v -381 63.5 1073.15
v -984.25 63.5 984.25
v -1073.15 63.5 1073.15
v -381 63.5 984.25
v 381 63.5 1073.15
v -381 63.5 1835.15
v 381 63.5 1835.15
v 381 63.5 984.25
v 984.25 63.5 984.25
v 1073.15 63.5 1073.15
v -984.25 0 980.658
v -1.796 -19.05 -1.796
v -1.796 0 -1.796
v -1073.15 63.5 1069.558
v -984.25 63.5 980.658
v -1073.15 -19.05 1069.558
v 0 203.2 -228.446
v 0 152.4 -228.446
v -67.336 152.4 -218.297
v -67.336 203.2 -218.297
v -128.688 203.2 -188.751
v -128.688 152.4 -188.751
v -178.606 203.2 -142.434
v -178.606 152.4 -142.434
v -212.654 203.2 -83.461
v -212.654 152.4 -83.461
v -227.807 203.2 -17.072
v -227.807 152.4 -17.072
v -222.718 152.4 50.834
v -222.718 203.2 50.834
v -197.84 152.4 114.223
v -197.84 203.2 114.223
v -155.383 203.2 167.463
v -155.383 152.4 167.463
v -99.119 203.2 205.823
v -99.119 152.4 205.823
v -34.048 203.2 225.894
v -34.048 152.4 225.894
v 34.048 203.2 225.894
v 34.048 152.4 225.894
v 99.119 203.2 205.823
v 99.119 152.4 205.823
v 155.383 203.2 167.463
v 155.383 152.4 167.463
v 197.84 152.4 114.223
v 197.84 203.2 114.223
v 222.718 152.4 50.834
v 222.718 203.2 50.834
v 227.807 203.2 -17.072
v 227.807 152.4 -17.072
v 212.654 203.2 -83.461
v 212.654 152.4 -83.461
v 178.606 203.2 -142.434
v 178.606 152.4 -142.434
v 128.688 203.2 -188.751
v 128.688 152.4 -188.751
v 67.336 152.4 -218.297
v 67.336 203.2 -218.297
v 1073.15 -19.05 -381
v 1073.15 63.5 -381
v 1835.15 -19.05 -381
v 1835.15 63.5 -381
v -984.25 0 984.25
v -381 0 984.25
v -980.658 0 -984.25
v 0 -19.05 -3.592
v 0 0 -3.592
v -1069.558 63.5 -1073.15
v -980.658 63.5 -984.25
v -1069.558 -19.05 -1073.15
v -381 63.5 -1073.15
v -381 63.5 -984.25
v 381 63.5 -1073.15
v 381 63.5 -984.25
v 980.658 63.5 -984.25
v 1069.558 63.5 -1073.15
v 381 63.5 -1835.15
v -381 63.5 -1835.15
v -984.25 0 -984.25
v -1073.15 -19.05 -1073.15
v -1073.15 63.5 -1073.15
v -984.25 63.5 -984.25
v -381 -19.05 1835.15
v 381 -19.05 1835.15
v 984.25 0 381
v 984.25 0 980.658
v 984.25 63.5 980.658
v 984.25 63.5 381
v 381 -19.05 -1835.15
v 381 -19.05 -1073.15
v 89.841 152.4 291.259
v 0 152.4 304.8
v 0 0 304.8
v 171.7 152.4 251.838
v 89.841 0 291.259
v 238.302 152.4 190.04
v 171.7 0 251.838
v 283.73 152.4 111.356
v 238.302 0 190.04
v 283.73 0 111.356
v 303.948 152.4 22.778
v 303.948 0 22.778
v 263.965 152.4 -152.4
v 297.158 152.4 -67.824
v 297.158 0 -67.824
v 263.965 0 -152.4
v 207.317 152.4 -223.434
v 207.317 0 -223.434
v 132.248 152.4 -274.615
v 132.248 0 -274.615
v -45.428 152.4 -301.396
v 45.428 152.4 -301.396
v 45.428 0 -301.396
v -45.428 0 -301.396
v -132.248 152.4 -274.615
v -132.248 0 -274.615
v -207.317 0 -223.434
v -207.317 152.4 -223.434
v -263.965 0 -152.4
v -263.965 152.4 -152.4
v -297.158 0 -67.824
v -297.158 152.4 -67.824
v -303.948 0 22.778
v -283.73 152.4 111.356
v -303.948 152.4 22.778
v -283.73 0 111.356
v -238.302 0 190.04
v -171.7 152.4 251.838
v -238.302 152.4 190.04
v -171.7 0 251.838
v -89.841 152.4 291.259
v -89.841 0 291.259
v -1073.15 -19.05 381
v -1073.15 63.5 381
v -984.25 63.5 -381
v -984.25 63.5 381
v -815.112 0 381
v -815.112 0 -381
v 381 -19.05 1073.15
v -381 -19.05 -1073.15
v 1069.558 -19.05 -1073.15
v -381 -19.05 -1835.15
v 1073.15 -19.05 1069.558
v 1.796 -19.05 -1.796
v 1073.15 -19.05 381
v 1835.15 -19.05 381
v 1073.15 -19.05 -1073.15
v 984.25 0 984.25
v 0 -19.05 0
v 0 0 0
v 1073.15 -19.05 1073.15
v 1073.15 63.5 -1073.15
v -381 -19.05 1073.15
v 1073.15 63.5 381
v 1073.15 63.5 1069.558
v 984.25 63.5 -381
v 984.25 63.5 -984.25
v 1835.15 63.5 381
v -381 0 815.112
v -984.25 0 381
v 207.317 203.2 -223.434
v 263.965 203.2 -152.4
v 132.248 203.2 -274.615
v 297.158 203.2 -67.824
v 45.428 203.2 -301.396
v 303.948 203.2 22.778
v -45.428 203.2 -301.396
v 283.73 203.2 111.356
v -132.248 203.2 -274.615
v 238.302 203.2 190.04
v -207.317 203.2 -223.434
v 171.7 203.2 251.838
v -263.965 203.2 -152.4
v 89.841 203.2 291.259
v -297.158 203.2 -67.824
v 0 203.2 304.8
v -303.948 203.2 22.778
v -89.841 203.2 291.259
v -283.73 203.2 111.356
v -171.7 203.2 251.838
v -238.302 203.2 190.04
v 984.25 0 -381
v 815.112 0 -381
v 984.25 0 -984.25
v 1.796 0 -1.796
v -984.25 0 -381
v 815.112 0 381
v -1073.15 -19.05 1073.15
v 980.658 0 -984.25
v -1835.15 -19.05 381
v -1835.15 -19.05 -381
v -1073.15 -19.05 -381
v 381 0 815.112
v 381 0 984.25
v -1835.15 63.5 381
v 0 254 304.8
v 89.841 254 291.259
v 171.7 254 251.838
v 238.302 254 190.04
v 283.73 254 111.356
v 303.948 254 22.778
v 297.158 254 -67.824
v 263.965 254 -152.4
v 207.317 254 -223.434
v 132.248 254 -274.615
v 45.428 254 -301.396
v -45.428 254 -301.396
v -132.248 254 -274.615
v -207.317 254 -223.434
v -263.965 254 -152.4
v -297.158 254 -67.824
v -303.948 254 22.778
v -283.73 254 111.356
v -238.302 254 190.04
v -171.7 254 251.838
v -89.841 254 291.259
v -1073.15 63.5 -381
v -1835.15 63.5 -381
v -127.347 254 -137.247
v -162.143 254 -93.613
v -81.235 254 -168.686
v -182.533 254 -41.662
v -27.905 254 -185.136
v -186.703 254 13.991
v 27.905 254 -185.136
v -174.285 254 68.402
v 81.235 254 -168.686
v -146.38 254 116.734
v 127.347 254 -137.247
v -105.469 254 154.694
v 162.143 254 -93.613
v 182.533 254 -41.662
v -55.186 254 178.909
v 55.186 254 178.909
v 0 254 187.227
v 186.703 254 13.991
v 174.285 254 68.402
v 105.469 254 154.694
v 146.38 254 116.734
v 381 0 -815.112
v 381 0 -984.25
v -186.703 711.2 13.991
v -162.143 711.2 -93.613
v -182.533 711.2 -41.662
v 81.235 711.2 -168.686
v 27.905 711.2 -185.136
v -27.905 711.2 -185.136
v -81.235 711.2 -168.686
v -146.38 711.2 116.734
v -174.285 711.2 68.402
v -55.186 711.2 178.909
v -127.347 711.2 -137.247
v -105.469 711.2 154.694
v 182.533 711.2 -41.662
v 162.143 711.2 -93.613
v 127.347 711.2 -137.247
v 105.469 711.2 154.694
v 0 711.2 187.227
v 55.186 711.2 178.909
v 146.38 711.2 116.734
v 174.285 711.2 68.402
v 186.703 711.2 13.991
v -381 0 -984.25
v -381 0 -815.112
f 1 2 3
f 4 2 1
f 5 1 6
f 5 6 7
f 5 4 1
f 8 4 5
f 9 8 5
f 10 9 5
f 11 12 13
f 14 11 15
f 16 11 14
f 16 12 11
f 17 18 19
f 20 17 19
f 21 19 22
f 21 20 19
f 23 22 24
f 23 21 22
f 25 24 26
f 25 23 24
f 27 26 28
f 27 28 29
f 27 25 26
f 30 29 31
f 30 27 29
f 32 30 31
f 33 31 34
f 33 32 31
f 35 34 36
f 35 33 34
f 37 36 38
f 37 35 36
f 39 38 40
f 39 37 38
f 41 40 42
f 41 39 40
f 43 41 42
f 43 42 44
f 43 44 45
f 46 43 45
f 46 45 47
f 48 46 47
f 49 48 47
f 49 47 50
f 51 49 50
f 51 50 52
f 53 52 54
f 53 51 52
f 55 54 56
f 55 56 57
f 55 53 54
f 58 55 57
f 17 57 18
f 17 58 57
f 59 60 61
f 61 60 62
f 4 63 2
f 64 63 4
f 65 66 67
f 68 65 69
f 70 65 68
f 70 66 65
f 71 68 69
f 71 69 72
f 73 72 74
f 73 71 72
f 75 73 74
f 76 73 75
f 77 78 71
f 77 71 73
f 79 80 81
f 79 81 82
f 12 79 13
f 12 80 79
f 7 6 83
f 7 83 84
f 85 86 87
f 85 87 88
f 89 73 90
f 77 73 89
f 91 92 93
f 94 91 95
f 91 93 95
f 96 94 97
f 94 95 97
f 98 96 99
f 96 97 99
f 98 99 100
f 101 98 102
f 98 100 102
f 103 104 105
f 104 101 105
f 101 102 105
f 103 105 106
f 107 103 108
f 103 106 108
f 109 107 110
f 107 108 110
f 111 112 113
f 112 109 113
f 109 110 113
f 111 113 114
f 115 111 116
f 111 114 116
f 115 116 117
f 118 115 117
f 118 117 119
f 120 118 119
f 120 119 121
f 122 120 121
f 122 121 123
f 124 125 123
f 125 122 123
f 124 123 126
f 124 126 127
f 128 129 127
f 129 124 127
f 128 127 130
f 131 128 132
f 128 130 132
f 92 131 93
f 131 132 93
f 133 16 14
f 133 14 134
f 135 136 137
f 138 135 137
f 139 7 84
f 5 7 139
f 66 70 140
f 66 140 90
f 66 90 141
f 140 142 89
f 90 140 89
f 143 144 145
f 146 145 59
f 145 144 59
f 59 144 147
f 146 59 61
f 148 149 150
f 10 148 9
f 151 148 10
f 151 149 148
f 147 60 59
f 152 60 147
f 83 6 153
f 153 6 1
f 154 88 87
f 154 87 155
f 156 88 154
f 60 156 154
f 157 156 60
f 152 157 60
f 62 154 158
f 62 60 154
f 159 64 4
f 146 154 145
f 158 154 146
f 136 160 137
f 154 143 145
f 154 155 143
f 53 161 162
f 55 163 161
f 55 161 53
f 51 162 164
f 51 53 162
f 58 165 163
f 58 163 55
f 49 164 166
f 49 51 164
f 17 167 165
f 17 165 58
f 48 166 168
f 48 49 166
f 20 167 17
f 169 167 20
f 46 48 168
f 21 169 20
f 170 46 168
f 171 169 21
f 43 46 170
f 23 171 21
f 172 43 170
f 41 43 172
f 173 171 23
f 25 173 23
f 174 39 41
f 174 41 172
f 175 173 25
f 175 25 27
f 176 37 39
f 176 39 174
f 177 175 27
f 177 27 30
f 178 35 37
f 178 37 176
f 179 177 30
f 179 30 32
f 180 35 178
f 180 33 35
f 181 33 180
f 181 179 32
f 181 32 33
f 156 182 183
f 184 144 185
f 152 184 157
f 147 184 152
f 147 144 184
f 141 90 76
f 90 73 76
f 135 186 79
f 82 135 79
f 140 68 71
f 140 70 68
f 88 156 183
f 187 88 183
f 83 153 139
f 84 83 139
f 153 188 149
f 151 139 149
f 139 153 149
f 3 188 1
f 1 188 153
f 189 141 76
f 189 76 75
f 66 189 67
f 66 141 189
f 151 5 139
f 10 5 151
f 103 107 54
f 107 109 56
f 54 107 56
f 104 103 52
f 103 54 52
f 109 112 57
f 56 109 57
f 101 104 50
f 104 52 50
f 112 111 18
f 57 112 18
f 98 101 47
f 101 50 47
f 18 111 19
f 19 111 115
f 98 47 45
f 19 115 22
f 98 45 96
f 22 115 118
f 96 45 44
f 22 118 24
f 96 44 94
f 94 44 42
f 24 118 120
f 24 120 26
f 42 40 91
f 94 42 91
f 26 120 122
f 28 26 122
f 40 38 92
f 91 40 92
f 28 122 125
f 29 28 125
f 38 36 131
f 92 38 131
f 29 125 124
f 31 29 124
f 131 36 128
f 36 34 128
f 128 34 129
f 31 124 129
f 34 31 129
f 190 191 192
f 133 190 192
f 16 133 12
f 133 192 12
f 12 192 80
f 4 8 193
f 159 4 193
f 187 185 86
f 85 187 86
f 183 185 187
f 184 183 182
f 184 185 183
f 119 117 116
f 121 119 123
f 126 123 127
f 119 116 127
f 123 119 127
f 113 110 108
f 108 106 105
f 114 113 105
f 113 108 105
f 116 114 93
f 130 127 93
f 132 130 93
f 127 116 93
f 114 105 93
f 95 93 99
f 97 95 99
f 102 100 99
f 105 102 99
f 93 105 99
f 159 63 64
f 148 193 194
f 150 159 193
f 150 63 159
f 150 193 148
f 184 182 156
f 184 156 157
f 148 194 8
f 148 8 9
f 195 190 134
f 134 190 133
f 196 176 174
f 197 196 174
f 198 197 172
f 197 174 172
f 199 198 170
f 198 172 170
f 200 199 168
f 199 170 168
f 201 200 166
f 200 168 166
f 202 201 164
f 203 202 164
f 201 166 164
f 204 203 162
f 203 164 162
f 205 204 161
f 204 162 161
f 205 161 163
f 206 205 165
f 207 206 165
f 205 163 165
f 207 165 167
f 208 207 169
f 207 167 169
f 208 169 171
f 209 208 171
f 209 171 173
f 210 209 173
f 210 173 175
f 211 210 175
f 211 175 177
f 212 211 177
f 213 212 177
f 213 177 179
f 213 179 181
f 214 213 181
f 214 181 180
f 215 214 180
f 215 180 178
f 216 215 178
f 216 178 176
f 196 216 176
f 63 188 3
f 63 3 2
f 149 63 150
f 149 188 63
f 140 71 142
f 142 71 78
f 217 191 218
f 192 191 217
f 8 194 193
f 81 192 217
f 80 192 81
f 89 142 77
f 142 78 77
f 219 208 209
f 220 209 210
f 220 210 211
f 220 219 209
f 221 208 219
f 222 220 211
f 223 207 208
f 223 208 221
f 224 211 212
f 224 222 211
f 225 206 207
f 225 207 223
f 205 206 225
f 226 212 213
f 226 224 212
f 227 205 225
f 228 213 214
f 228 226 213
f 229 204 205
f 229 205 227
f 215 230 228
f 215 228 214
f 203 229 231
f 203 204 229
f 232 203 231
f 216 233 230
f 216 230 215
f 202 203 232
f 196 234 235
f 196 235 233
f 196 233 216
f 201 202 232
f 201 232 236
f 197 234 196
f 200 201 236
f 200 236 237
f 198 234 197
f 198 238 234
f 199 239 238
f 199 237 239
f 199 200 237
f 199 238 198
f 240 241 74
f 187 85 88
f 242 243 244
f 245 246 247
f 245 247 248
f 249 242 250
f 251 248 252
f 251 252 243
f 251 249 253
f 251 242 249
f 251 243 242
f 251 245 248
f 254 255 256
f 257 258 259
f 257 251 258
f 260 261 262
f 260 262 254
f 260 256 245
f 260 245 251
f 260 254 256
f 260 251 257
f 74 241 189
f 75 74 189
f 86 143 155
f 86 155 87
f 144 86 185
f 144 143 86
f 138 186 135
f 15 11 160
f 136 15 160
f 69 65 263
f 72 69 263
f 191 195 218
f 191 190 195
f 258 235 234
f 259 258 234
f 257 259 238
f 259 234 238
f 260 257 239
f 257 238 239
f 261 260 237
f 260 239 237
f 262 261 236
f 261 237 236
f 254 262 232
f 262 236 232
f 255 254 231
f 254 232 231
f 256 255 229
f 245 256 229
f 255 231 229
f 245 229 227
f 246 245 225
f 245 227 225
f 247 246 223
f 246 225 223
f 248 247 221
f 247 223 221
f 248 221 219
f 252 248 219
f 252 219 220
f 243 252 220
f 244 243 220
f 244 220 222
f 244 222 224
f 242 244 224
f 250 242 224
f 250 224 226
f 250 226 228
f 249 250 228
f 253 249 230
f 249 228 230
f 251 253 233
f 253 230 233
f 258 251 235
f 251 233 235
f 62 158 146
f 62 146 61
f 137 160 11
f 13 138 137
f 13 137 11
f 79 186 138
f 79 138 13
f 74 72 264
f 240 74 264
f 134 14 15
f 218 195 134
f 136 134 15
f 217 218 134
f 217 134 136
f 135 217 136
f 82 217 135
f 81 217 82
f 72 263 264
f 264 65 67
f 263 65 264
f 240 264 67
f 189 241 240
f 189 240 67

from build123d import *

# Parameters (mm, degrees)
PLYWOOD_BASE_DEPTH           = 19.05
FIELD_LAYOUT_3_W             = 1968.5
FIELD_LAYOUT_3_H             = 1968.5
RAISED_BASE_DEPTH            = 63.5
FIELD_LAYOUT_4_W             = 762
FIELD_LAYOUT_4_H             = 169.138249808
RAMP_EXTRUDE_DEPTH           = 63.5
CUT_RAMP_SLOPE_REACH         = 2880.042
COPY_RAMP_SLOPE_COUNT        = 4
SKETCH5_R                    = 304.8
BOSS_EXTRUDE1_DEPTH          = 254
CUT_EXTRUDE_THIN1_DEPTH      = 2608.693817341
CUT_EXTRUDE_THIN1_DEPTH_BACK = 2608.693817341
SKETCH6_R                    = 187.226802171
BOSS_EXTRUDE2_DEPTH          = 457.2
SKETCH7_W                    = 76.354251867
SKETCH7_H                    = 50.8


with BuildPart() as part:
    # Field Layout → Plywood Base (new body)
    with BuildSketch(Plane(origin=(0, 0, 0), x_dir=(1, 0, 0), z_dir=(0, 1, 0))):
        Polygon((-381, 1073.15), (-1073.15, 1073.15), (-1073.15, 381), (-1835.15, 381), (-1835.15, -381), (-1073.15, -381), (-1073.15, -1073.15), (-381, -1073.15), (-381, -1835.15), (381, -1835.15), (381, -1073.15), (1073.15, -1073.15), (1073.15, -381), (1835.15, -381), (1835.15, 381), (1073.15, 381), (1073.15, 1073.15), (381, 1073.15), (381, 1835.15), (-381, 1835.15), align=None)
    extrude(amount=-PLYWOOD_BASE_DEPTH)

    # Field Layout<3> → Raised Base (add)
    with BuildSketch(Plane(origin=(0, 0, 0), x_dir=(1, 0, 0), z_dir=(0, 1, 0))):
        Polygon((-381, 1073.15), (-1073.15, 1073.15), (-1073.15, 381), (-1835.15, 381), (-1835.15, -381), (-1073.15, -381), (-1073.15, -1073.15), (-381, -1073.15), (-381, -1835.15), (381, -1835.15), (381, -1073.15), (1073.15, -1073.15), (1073.15, -381), (1835.15, -381), (1835.15, 381), (1073.15, 381), (1073.15, 1073.15), (381, 1073.15), (381, 1835.15), (-381, 1835.15), align=None)
        Rectangle(FIELD_LAYOUT_3_W, FIELD_LAYOUT_3_H, mode=Mode.SUBTRACT)
    extrude(amount=RAISED_BASE_DEPTH)

    # Field Layout<4> → Ramp Extrude (add)
    with BuildSketch(Plane(origin=(0, 0, 0), x_dir=(1, 0, 0), z_dir=(0, 1, 0))):
        with Locations((0, -899.680875096)):
            Rectangle(FIELD_LAYOUT_4_W, FIELD_LAYOUT_4_H)
    ramp_extrude = extrude(amount=RAMP_EXTRUDE_DEPTH)

    # Sketch3 → Cut ramp slope (cut, up to next)
    with BuildSketch(Plane(origin=(381, 0, 0), x_dir=(0, 0, -1), z_dir=(1, 0, 0)), mode=Mode.PRIVATE) as cut_ramp_slope_sk1:
        Polygon((-815.111750192, 63.5), (-984.25, 63.5), (-815.111750192, 0), align=None)
    cut_ramp_slope_tool1 = extrude(cut_ramp_slope_sk1.sketch, amount=-CUT_RAMP_SLOPE_REACH, mode=Mode.PRIVATE) & part.part
    cut_ramp_slope = cut_ramp_slope_tool1.solids().sort_by_distance((381, 42.333333, 871.491167))[0]
    add(cut_ramp_slope, mode=Mode.SUBTRACT)

    # Copy Ramp Slope: Ramp Extrude, Cut ramp slope ×4 about axis
    copy_ramp_slope_axis = Axis((0, -19.05, 0), (0, -1, 0))
    add([ramp_extrude.rotate(copy_ramp_slope_axis, i * 360 / COPY_RAMP_SLOPE_COUNT) for i in range(1, COPY_RAMP_SLOPE_COUNT)])
    add([cut_ramp_slope.rotate(copy_ramp_slope_axis, i * 360 / COPY_RAMP_SLOPE_COUNT) for i in range(1, COPY_RAMP_SLOPE_COUNT)], mode=Mode.SUBTRACT)

    # Sketch4 → Cut-Extrude-Thin1 (cut, two sides: drawn at the far end of the back side and taken through both)
    with BuildSketch(Plane(origin=(0, 0, 0), x_dir=(1, 0, 0), z_dir=(0, 1, 0)).offset(-CUT_EXTRUDE_THIN1_DEPTH_BACK)):
        Polygon((-1073.15, -1073.15), (-984.25, -984.25), (984.25, 984.25), (1073.15, 1073.15), (1071.353948776, 1074.946051224), (982.453948776, 986.046051224), (-986.046051224, -982.453948776), (-1074.946051224, -1071.353948776), align=None)
        Polygon((-1073.15, 1073.15), (-984.25, 984.25), (984.25, -984.25), (1073.15, -1073.15), (1074.946051224, -1071.353948776), (986.046051224, -982.453948776), (-982.453948776, 986.046051224), (-1071.353948776, 1074.946051224), align=None)
    extrude(amount=CUT_EXTRUDE_THIN1_DEPTH + CUT_EXTRUDE_THIN1_DEPTH_BACK, mode=Mode.SUBTRACT)


with BuildPart() as body_2:
    # Sketch5 → Boss-Extrude1 (new body)
    with BuildSketch(Plane(origin=(0, 0, 0), x_dir=(1, 0, 0), z_dir=(0, 1, 0))):
        Circle(SKETCH5_R)
    extrude(amount=BOSS_EXTRUDE1_DEPTH)

    # Sketch6 → Boss-Extrude2 (add)
    with BuildSketch(Plane(origin=(0, 254, 0), x_dir=(1, 0, 0), z_dir=(0, 1, 0))):
        Circle(SKETCH6_R)
    extrude(amount=BOSS_EXTRUDE2_DEPTH)

    # Sketch7 → Cut-Revolve1 (revolve, cut)
    with BuildSketch(Plane.XY):
        with Locations((266.622874067, 177.8)):
            Rectangle(SKETCH7_W, SKETCH7_H)
    revolve(axis=Axis((0, 0, 0), (0, 1, 0)), mode=Mode.SUBTRACT)


with BuildPart() as cut_extrude_thin1_piece_1:
    # of the separate pieces the step leaves, piece 1, a body of its own (cut_extrude_thin1_pieces)
    add(part.part.solids().sort_by_distance((0, -19.05, 0))[0])


with BuildPart() as cut_extrude_thin1_piece_2:
    # of the separate pieces the step leaves, piece 2, a body of its own (cut_extrude_thin1_pieces)
    add(part.part.solids().sort_by_distance((-1073.15, -19.05, -1073.15))[0])


with BuildPart() as cut_extrude_thin1_piece_3:
    # of the separate pieces the step leaves, piece 3, a body of its own (cut_extrude_thin1_pieces)
    add(part.part.solids().sort_by_distance((1073.15, 63.5, -381))[0])


with BuildPart() as cut_extrude_thin1_piece_4:
    # of the separate pieces the step leaves, piece 4, a body of its own (cut_extrude_thin1_pieces)
    add(part.part.solids().sort_by_distance((-381, 63.5, -1073.15))[0])


solid = Compound([body_2.part, cut_extrude_thin1_piece_1.part, cut_extrude_thin1_piece_2.part, cut_extrude_thin1_piece_3.part, cut_extrude_thin1_piece_4.part])
